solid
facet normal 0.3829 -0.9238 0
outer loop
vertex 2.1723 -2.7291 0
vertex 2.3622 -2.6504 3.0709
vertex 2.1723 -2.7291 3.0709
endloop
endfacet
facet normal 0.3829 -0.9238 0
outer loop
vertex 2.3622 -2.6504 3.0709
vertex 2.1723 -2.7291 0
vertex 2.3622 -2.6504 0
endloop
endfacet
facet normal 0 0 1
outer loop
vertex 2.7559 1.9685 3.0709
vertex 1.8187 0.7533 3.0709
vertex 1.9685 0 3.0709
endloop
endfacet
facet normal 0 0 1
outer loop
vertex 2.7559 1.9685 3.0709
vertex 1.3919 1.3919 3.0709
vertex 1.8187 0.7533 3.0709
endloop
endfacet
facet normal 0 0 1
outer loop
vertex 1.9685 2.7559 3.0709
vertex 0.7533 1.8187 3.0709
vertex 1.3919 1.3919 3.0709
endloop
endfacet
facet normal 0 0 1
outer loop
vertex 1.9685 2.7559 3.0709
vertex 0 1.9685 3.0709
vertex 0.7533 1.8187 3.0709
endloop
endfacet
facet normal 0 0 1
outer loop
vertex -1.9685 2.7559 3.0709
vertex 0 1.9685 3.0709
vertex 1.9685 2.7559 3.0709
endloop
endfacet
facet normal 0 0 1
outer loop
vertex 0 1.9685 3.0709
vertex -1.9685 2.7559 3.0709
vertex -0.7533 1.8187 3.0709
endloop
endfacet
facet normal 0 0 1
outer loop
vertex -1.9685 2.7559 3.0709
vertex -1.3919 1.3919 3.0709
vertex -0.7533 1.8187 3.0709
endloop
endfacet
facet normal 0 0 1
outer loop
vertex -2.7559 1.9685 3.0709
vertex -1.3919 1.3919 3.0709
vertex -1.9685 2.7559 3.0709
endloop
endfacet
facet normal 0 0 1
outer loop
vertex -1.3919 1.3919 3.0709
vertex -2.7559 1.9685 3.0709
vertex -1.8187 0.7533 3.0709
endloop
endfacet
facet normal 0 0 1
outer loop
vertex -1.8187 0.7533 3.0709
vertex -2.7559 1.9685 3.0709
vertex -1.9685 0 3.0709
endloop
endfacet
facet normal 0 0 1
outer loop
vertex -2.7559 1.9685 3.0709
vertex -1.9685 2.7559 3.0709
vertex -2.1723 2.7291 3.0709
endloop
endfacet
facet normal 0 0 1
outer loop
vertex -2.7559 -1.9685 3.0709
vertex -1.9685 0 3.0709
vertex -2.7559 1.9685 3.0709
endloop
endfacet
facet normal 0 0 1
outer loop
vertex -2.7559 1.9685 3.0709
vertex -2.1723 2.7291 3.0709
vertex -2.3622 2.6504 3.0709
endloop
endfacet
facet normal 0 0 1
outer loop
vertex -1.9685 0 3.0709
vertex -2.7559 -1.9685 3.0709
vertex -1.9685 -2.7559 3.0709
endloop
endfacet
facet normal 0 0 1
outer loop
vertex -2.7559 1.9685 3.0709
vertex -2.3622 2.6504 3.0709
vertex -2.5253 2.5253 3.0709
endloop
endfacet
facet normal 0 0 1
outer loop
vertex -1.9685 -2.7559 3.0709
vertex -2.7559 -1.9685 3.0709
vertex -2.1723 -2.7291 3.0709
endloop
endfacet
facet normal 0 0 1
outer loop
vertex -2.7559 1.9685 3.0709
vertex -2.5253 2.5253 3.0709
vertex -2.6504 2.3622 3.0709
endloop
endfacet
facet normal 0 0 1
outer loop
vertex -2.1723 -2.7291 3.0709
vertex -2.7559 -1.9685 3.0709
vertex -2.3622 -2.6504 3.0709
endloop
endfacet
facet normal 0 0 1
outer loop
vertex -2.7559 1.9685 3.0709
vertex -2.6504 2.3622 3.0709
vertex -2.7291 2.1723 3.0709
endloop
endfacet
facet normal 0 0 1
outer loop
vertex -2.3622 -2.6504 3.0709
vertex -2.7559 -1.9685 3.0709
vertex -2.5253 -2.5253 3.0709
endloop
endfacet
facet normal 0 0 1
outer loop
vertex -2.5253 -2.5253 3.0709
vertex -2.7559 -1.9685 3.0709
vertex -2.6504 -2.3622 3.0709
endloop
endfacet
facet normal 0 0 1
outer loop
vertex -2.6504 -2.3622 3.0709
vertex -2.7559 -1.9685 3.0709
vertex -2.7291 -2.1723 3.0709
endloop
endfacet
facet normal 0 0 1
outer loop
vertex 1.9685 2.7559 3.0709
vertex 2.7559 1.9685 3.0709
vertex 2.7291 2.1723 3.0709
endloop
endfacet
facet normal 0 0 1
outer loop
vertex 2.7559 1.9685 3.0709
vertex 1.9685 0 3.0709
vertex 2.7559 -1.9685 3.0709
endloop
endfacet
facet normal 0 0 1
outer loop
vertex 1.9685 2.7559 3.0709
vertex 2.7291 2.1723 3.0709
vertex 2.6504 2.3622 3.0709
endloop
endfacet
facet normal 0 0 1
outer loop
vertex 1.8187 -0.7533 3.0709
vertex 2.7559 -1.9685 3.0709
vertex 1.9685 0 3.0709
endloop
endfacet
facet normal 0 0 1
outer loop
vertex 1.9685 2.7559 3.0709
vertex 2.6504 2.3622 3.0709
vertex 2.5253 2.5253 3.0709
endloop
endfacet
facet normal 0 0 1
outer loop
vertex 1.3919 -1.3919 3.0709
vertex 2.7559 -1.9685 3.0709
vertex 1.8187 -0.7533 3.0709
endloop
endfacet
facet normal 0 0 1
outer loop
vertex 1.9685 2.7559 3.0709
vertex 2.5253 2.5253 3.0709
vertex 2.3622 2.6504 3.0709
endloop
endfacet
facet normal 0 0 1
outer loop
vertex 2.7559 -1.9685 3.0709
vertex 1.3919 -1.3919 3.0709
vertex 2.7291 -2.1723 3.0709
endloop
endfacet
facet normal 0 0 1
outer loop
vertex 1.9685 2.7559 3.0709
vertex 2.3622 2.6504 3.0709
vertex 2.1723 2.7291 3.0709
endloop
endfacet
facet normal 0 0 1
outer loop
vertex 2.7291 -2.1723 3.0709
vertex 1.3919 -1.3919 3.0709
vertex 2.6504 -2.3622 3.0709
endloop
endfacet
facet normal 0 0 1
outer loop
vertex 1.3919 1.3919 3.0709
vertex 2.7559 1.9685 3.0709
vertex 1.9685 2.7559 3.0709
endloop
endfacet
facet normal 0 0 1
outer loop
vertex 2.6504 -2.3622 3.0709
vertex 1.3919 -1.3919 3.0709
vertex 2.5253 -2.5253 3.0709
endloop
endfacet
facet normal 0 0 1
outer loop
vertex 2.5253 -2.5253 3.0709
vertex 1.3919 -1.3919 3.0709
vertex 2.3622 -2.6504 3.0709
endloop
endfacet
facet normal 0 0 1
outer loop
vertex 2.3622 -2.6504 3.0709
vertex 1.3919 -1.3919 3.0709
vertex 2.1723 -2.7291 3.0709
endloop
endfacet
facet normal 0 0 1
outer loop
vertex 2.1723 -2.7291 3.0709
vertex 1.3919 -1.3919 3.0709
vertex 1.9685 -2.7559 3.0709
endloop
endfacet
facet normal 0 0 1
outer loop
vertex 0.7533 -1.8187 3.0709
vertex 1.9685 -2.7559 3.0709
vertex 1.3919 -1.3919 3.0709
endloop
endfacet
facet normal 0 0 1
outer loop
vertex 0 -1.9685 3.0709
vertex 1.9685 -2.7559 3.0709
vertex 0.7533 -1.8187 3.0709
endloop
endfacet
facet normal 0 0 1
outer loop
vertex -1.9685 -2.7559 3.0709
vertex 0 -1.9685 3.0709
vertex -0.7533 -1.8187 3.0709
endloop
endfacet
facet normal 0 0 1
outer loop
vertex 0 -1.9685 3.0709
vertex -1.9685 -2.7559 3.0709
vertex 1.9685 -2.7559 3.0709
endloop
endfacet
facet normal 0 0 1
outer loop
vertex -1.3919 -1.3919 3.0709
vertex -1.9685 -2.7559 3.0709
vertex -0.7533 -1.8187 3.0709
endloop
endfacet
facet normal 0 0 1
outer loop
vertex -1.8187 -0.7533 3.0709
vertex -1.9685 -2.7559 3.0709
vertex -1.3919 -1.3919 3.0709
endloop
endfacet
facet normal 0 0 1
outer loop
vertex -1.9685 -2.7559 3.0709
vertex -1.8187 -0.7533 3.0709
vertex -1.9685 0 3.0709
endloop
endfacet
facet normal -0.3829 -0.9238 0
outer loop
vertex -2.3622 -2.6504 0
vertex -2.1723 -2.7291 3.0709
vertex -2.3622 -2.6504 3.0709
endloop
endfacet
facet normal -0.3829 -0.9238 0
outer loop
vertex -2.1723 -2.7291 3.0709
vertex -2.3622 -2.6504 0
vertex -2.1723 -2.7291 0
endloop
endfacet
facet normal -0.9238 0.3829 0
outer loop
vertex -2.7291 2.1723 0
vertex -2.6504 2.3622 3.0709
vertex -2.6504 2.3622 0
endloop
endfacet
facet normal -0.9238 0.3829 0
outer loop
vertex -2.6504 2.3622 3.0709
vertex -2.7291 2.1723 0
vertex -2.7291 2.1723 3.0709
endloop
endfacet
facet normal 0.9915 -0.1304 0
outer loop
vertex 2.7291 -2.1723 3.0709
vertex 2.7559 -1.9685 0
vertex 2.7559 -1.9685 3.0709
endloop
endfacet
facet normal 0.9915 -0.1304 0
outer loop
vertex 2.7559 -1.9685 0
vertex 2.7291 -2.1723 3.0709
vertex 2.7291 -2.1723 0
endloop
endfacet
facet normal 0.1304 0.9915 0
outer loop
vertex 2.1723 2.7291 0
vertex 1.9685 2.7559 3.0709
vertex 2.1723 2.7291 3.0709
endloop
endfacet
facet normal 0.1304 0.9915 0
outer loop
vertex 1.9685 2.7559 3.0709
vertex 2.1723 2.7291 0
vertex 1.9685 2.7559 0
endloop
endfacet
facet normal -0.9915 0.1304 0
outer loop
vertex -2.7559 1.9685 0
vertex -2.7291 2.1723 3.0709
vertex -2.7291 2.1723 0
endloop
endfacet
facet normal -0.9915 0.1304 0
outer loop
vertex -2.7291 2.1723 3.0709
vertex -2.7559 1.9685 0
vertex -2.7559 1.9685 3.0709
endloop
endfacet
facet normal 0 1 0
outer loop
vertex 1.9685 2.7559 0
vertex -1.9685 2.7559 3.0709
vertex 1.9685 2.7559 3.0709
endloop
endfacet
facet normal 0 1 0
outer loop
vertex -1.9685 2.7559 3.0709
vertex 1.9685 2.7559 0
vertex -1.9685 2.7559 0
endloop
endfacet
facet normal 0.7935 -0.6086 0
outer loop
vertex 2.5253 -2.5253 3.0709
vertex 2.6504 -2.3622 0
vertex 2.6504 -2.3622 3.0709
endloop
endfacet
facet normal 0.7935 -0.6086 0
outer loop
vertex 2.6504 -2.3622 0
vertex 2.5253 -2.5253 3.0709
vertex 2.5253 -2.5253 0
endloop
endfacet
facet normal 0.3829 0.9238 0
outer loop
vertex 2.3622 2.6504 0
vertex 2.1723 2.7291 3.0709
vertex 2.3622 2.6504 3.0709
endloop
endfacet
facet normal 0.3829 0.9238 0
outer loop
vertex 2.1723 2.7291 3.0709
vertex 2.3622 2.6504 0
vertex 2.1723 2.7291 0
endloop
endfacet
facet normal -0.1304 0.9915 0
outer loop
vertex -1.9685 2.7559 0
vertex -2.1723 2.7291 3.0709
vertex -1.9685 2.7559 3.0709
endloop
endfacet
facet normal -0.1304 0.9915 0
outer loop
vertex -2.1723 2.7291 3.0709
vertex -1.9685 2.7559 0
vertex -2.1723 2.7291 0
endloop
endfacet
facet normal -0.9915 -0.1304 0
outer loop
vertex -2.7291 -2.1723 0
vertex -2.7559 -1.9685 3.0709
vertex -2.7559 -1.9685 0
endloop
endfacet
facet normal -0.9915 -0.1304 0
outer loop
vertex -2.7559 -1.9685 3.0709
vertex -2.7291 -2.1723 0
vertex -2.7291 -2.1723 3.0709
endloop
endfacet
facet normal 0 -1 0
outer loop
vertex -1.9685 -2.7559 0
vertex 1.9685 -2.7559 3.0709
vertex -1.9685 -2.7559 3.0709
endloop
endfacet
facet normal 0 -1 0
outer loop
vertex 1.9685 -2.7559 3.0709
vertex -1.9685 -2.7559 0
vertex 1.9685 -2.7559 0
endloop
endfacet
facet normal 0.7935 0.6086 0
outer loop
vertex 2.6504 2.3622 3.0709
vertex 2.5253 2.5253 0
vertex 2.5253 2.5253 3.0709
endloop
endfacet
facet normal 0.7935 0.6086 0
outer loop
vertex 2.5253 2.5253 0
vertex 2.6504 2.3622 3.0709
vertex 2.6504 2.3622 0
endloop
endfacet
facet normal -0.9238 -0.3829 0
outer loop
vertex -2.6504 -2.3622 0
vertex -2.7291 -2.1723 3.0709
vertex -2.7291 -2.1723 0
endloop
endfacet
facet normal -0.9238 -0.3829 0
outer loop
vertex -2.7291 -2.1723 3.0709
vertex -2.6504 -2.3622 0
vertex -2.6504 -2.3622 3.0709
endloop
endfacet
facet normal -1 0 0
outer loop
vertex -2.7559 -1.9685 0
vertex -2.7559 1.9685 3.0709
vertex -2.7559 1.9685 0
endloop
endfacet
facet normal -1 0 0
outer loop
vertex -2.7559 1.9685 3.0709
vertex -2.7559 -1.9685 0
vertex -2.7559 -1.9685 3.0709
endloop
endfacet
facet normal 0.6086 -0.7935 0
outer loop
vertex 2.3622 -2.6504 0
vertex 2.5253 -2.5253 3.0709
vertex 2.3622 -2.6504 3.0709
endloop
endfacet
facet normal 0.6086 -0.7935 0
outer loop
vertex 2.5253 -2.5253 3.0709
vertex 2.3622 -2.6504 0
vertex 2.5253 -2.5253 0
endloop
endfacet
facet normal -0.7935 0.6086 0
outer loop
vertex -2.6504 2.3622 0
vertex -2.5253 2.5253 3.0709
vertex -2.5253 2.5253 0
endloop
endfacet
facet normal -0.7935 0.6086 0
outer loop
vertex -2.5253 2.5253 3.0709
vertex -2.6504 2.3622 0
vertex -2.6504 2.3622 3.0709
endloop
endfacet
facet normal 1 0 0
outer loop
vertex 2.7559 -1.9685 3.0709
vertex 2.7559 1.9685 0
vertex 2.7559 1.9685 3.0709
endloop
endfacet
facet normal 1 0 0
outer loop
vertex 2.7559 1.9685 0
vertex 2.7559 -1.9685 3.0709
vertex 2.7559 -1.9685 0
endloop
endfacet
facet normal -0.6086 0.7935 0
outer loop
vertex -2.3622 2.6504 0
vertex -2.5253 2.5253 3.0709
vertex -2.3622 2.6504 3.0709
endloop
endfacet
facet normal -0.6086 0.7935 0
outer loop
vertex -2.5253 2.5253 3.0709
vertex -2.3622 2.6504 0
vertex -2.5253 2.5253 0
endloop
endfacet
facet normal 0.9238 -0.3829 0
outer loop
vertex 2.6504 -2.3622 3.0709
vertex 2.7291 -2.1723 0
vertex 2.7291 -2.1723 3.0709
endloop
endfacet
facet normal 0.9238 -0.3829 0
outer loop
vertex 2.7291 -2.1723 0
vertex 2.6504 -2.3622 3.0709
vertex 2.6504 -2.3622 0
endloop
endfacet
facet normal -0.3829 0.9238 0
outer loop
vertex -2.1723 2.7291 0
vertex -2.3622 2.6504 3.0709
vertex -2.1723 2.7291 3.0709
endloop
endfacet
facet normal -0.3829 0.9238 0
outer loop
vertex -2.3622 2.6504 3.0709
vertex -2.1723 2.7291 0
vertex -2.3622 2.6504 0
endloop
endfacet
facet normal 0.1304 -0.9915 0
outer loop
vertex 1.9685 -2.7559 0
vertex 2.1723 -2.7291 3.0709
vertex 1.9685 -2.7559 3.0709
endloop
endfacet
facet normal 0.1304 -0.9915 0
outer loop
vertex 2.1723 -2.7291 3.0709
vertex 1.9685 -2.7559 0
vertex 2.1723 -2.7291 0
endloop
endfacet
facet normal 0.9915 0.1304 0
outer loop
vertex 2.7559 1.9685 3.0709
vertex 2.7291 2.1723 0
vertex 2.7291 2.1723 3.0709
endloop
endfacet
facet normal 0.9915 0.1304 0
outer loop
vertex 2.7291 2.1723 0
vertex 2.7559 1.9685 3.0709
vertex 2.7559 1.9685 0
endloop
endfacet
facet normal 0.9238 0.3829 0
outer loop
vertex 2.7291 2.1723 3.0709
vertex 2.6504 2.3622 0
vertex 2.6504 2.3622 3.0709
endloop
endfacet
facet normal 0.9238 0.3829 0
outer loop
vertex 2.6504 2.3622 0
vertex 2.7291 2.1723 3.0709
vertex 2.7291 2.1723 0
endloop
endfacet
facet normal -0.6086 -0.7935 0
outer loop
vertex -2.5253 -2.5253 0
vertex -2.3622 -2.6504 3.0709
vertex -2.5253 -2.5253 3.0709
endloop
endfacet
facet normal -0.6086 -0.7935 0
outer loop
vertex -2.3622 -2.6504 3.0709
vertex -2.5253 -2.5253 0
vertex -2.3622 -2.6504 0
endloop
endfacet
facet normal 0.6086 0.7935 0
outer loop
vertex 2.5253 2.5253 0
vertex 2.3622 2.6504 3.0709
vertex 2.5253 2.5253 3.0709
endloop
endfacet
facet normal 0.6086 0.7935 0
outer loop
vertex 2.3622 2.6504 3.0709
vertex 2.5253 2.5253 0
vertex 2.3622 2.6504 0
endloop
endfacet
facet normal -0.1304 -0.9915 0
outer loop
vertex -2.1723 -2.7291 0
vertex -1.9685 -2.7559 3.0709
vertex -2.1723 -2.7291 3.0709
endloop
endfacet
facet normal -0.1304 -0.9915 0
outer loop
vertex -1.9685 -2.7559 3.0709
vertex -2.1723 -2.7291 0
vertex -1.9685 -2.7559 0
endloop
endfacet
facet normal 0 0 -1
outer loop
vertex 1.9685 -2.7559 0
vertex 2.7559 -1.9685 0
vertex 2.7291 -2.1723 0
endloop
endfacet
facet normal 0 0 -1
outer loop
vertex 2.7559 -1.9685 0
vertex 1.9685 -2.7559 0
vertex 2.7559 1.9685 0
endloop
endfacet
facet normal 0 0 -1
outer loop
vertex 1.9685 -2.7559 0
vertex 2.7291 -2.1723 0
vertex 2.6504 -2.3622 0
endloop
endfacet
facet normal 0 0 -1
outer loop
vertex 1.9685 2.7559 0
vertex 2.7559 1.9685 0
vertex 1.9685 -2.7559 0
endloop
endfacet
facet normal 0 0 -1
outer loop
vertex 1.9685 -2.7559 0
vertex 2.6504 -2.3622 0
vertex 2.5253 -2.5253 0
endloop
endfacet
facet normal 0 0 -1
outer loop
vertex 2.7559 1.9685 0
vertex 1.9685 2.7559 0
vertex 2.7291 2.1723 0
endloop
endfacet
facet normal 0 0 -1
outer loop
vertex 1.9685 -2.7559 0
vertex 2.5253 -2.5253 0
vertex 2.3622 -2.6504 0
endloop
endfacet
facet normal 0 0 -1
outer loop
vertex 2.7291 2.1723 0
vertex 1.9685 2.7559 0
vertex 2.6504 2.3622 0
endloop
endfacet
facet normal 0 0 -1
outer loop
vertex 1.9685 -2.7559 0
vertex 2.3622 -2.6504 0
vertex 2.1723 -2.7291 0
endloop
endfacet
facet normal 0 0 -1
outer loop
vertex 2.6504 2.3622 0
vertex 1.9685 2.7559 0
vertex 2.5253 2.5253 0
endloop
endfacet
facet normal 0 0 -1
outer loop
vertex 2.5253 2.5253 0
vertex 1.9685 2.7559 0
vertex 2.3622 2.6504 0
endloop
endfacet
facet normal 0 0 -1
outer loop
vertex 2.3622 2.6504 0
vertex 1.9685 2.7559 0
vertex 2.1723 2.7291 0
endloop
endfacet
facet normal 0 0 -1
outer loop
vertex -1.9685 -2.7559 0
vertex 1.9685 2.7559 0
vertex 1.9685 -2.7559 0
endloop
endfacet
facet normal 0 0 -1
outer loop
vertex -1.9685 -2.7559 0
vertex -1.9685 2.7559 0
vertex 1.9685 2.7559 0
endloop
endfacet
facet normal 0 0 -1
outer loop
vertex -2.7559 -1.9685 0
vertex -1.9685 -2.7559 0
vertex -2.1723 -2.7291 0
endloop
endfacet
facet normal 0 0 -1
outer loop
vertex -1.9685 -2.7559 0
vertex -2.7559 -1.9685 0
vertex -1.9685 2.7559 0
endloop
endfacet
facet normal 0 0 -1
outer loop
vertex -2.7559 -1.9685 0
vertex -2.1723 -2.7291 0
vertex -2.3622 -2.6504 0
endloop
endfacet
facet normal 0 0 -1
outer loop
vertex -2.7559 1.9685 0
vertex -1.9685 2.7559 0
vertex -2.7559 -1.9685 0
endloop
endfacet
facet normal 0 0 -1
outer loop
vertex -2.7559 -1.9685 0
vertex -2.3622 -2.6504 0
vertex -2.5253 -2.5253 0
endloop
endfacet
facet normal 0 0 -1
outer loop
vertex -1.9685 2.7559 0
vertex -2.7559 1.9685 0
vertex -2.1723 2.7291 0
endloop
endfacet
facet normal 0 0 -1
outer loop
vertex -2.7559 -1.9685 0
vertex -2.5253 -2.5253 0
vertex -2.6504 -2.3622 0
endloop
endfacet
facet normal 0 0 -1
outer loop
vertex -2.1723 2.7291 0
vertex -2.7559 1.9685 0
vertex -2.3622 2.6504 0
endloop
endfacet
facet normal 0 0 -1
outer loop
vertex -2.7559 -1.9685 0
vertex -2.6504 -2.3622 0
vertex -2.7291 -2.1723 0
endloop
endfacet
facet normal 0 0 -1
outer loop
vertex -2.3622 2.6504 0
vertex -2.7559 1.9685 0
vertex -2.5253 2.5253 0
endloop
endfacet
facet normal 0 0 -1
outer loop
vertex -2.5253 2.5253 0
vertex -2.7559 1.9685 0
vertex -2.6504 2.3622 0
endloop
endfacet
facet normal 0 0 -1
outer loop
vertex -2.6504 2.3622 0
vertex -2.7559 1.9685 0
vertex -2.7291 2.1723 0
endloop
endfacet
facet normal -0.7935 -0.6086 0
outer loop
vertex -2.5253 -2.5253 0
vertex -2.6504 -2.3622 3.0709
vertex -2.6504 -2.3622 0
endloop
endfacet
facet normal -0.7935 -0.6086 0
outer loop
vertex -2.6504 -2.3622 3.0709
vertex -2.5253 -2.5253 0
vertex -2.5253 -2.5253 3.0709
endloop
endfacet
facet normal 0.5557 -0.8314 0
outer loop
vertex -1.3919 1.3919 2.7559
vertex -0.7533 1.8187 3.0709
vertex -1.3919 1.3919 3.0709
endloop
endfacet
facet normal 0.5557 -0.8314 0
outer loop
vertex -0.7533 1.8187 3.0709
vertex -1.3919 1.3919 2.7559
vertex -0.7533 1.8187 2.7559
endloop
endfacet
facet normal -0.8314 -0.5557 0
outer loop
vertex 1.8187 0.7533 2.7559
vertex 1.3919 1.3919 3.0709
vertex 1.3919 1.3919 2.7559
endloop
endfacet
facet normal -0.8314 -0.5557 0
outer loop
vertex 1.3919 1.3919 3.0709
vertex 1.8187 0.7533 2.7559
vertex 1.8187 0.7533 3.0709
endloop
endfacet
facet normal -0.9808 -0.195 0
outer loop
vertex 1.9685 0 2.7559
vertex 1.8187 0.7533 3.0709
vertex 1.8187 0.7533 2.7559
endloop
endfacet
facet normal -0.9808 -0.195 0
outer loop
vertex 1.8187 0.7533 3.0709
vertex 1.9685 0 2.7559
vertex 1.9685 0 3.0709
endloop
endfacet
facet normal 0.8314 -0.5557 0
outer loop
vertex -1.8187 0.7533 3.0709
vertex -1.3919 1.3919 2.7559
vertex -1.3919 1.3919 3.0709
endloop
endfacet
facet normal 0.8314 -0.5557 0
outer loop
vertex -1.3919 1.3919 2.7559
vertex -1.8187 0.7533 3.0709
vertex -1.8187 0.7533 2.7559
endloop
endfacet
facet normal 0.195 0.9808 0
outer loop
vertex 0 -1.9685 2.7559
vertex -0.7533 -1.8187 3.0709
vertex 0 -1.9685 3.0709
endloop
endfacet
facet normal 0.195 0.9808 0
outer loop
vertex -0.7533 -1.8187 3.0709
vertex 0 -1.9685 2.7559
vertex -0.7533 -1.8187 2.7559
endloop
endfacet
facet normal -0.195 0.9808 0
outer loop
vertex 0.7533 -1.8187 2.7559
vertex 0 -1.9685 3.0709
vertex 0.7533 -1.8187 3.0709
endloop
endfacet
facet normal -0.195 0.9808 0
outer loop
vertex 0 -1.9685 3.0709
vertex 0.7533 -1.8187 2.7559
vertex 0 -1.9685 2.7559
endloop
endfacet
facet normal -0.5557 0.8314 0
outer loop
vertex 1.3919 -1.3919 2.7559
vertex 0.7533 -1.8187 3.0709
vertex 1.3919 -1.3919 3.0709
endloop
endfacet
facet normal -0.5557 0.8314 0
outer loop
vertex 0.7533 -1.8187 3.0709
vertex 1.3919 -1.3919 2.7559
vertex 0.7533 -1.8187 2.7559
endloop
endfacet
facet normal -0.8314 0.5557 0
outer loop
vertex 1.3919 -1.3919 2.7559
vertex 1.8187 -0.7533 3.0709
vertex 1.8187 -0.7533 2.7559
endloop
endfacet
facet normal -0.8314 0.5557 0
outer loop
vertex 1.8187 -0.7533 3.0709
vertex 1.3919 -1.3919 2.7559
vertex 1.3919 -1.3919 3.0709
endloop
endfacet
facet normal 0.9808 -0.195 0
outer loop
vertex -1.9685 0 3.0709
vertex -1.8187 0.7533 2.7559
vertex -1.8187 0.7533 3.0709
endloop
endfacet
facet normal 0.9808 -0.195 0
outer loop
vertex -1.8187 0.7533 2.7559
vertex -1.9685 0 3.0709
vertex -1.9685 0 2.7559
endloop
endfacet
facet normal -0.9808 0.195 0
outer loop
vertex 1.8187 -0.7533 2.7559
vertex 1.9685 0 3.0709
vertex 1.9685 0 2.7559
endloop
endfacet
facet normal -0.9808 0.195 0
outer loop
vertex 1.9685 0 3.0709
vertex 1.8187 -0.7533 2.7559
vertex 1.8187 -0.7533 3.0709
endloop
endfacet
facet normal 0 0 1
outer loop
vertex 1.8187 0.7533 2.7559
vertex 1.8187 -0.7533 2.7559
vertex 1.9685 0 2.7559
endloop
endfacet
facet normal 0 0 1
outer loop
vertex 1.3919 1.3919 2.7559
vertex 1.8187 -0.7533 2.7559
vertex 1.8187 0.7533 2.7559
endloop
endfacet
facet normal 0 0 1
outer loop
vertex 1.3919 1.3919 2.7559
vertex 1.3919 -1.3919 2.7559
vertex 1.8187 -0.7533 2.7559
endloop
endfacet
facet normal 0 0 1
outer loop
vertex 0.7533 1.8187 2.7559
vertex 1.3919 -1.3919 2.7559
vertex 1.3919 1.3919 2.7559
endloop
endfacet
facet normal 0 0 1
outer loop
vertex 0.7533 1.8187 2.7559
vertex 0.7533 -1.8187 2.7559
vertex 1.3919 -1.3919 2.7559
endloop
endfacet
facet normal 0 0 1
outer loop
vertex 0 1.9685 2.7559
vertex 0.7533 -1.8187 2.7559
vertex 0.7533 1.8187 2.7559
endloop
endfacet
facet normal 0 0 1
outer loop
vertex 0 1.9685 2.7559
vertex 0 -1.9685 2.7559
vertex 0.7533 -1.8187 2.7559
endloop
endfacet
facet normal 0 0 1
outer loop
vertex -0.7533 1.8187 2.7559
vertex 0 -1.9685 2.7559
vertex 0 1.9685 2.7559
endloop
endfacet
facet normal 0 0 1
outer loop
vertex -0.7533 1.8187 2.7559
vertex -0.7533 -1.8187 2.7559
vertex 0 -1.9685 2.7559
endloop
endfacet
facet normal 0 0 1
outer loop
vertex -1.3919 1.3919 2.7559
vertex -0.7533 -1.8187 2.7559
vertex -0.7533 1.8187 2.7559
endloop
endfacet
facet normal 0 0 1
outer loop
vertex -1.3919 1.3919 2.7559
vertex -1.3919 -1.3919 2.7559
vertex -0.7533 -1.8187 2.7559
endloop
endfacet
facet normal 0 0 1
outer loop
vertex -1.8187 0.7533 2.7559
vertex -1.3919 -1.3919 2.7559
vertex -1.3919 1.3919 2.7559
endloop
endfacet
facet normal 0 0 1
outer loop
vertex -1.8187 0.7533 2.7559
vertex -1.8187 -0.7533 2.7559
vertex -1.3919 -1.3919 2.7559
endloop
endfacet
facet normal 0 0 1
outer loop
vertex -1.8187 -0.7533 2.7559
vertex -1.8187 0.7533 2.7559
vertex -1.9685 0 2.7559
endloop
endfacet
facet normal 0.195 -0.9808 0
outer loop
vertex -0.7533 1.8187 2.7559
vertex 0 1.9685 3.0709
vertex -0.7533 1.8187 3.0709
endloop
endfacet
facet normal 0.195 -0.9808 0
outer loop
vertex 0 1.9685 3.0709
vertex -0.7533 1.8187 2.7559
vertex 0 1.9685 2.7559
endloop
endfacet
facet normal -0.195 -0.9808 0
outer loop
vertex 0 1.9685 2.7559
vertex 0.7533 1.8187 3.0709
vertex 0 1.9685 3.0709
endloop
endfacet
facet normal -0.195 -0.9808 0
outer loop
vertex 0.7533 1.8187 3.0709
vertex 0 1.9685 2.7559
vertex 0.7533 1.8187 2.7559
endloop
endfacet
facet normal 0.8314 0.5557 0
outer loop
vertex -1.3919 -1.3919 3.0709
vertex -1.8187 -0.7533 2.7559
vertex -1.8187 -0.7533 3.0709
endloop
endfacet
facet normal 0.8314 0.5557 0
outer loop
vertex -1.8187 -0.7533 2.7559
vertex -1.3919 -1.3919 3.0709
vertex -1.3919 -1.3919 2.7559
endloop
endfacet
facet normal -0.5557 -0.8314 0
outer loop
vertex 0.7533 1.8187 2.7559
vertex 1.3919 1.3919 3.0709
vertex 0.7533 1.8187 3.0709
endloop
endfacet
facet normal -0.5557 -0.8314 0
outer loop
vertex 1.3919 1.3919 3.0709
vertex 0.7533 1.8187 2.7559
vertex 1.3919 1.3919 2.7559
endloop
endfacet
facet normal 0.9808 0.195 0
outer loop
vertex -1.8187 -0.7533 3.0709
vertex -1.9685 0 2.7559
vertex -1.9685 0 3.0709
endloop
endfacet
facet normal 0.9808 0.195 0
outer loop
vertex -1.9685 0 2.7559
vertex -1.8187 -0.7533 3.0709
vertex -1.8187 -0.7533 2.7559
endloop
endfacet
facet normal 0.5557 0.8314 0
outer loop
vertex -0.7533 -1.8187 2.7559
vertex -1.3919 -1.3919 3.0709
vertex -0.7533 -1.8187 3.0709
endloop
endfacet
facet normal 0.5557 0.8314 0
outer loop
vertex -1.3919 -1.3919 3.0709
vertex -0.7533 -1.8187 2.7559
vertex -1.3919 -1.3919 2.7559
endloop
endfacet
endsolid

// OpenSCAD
f=1/2.54; // convert to inches
scale([f,f,f])difference(){
hull($fn=24)
for(x=[-1,1])
for(y=[-1,1])
translate([x*10/2,y*10/2,0])cylinder(r=2, h=7.8);
translate([0,0,7])cylinder(r=5, h=1);
}
